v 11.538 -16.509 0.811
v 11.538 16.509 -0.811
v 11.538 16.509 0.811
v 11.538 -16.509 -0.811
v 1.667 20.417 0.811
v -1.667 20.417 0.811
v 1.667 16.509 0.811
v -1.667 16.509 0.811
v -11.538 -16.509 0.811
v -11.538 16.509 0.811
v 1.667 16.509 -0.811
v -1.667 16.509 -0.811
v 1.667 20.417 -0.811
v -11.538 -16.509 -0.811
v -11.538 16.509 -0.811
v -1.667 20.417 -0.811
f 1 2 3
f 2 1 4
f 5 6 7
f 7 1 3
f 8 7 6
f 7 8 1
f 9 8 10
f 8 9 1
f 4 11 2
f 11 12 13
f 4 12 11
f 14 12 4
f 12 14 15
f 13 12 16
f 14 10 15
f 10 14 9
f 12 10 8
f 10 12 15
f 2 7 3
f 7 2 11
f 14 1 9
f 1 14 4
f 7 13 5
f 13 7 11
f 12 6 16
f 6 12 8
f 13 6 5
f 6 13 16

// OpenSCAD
width=30;

depth=35;

height=30;

cube([width/1.3,depth/1.06,height/18.5],center=true);

translate([0,depth/2,0])cube([width/9,depth/6,height/18.5],center=true); 
